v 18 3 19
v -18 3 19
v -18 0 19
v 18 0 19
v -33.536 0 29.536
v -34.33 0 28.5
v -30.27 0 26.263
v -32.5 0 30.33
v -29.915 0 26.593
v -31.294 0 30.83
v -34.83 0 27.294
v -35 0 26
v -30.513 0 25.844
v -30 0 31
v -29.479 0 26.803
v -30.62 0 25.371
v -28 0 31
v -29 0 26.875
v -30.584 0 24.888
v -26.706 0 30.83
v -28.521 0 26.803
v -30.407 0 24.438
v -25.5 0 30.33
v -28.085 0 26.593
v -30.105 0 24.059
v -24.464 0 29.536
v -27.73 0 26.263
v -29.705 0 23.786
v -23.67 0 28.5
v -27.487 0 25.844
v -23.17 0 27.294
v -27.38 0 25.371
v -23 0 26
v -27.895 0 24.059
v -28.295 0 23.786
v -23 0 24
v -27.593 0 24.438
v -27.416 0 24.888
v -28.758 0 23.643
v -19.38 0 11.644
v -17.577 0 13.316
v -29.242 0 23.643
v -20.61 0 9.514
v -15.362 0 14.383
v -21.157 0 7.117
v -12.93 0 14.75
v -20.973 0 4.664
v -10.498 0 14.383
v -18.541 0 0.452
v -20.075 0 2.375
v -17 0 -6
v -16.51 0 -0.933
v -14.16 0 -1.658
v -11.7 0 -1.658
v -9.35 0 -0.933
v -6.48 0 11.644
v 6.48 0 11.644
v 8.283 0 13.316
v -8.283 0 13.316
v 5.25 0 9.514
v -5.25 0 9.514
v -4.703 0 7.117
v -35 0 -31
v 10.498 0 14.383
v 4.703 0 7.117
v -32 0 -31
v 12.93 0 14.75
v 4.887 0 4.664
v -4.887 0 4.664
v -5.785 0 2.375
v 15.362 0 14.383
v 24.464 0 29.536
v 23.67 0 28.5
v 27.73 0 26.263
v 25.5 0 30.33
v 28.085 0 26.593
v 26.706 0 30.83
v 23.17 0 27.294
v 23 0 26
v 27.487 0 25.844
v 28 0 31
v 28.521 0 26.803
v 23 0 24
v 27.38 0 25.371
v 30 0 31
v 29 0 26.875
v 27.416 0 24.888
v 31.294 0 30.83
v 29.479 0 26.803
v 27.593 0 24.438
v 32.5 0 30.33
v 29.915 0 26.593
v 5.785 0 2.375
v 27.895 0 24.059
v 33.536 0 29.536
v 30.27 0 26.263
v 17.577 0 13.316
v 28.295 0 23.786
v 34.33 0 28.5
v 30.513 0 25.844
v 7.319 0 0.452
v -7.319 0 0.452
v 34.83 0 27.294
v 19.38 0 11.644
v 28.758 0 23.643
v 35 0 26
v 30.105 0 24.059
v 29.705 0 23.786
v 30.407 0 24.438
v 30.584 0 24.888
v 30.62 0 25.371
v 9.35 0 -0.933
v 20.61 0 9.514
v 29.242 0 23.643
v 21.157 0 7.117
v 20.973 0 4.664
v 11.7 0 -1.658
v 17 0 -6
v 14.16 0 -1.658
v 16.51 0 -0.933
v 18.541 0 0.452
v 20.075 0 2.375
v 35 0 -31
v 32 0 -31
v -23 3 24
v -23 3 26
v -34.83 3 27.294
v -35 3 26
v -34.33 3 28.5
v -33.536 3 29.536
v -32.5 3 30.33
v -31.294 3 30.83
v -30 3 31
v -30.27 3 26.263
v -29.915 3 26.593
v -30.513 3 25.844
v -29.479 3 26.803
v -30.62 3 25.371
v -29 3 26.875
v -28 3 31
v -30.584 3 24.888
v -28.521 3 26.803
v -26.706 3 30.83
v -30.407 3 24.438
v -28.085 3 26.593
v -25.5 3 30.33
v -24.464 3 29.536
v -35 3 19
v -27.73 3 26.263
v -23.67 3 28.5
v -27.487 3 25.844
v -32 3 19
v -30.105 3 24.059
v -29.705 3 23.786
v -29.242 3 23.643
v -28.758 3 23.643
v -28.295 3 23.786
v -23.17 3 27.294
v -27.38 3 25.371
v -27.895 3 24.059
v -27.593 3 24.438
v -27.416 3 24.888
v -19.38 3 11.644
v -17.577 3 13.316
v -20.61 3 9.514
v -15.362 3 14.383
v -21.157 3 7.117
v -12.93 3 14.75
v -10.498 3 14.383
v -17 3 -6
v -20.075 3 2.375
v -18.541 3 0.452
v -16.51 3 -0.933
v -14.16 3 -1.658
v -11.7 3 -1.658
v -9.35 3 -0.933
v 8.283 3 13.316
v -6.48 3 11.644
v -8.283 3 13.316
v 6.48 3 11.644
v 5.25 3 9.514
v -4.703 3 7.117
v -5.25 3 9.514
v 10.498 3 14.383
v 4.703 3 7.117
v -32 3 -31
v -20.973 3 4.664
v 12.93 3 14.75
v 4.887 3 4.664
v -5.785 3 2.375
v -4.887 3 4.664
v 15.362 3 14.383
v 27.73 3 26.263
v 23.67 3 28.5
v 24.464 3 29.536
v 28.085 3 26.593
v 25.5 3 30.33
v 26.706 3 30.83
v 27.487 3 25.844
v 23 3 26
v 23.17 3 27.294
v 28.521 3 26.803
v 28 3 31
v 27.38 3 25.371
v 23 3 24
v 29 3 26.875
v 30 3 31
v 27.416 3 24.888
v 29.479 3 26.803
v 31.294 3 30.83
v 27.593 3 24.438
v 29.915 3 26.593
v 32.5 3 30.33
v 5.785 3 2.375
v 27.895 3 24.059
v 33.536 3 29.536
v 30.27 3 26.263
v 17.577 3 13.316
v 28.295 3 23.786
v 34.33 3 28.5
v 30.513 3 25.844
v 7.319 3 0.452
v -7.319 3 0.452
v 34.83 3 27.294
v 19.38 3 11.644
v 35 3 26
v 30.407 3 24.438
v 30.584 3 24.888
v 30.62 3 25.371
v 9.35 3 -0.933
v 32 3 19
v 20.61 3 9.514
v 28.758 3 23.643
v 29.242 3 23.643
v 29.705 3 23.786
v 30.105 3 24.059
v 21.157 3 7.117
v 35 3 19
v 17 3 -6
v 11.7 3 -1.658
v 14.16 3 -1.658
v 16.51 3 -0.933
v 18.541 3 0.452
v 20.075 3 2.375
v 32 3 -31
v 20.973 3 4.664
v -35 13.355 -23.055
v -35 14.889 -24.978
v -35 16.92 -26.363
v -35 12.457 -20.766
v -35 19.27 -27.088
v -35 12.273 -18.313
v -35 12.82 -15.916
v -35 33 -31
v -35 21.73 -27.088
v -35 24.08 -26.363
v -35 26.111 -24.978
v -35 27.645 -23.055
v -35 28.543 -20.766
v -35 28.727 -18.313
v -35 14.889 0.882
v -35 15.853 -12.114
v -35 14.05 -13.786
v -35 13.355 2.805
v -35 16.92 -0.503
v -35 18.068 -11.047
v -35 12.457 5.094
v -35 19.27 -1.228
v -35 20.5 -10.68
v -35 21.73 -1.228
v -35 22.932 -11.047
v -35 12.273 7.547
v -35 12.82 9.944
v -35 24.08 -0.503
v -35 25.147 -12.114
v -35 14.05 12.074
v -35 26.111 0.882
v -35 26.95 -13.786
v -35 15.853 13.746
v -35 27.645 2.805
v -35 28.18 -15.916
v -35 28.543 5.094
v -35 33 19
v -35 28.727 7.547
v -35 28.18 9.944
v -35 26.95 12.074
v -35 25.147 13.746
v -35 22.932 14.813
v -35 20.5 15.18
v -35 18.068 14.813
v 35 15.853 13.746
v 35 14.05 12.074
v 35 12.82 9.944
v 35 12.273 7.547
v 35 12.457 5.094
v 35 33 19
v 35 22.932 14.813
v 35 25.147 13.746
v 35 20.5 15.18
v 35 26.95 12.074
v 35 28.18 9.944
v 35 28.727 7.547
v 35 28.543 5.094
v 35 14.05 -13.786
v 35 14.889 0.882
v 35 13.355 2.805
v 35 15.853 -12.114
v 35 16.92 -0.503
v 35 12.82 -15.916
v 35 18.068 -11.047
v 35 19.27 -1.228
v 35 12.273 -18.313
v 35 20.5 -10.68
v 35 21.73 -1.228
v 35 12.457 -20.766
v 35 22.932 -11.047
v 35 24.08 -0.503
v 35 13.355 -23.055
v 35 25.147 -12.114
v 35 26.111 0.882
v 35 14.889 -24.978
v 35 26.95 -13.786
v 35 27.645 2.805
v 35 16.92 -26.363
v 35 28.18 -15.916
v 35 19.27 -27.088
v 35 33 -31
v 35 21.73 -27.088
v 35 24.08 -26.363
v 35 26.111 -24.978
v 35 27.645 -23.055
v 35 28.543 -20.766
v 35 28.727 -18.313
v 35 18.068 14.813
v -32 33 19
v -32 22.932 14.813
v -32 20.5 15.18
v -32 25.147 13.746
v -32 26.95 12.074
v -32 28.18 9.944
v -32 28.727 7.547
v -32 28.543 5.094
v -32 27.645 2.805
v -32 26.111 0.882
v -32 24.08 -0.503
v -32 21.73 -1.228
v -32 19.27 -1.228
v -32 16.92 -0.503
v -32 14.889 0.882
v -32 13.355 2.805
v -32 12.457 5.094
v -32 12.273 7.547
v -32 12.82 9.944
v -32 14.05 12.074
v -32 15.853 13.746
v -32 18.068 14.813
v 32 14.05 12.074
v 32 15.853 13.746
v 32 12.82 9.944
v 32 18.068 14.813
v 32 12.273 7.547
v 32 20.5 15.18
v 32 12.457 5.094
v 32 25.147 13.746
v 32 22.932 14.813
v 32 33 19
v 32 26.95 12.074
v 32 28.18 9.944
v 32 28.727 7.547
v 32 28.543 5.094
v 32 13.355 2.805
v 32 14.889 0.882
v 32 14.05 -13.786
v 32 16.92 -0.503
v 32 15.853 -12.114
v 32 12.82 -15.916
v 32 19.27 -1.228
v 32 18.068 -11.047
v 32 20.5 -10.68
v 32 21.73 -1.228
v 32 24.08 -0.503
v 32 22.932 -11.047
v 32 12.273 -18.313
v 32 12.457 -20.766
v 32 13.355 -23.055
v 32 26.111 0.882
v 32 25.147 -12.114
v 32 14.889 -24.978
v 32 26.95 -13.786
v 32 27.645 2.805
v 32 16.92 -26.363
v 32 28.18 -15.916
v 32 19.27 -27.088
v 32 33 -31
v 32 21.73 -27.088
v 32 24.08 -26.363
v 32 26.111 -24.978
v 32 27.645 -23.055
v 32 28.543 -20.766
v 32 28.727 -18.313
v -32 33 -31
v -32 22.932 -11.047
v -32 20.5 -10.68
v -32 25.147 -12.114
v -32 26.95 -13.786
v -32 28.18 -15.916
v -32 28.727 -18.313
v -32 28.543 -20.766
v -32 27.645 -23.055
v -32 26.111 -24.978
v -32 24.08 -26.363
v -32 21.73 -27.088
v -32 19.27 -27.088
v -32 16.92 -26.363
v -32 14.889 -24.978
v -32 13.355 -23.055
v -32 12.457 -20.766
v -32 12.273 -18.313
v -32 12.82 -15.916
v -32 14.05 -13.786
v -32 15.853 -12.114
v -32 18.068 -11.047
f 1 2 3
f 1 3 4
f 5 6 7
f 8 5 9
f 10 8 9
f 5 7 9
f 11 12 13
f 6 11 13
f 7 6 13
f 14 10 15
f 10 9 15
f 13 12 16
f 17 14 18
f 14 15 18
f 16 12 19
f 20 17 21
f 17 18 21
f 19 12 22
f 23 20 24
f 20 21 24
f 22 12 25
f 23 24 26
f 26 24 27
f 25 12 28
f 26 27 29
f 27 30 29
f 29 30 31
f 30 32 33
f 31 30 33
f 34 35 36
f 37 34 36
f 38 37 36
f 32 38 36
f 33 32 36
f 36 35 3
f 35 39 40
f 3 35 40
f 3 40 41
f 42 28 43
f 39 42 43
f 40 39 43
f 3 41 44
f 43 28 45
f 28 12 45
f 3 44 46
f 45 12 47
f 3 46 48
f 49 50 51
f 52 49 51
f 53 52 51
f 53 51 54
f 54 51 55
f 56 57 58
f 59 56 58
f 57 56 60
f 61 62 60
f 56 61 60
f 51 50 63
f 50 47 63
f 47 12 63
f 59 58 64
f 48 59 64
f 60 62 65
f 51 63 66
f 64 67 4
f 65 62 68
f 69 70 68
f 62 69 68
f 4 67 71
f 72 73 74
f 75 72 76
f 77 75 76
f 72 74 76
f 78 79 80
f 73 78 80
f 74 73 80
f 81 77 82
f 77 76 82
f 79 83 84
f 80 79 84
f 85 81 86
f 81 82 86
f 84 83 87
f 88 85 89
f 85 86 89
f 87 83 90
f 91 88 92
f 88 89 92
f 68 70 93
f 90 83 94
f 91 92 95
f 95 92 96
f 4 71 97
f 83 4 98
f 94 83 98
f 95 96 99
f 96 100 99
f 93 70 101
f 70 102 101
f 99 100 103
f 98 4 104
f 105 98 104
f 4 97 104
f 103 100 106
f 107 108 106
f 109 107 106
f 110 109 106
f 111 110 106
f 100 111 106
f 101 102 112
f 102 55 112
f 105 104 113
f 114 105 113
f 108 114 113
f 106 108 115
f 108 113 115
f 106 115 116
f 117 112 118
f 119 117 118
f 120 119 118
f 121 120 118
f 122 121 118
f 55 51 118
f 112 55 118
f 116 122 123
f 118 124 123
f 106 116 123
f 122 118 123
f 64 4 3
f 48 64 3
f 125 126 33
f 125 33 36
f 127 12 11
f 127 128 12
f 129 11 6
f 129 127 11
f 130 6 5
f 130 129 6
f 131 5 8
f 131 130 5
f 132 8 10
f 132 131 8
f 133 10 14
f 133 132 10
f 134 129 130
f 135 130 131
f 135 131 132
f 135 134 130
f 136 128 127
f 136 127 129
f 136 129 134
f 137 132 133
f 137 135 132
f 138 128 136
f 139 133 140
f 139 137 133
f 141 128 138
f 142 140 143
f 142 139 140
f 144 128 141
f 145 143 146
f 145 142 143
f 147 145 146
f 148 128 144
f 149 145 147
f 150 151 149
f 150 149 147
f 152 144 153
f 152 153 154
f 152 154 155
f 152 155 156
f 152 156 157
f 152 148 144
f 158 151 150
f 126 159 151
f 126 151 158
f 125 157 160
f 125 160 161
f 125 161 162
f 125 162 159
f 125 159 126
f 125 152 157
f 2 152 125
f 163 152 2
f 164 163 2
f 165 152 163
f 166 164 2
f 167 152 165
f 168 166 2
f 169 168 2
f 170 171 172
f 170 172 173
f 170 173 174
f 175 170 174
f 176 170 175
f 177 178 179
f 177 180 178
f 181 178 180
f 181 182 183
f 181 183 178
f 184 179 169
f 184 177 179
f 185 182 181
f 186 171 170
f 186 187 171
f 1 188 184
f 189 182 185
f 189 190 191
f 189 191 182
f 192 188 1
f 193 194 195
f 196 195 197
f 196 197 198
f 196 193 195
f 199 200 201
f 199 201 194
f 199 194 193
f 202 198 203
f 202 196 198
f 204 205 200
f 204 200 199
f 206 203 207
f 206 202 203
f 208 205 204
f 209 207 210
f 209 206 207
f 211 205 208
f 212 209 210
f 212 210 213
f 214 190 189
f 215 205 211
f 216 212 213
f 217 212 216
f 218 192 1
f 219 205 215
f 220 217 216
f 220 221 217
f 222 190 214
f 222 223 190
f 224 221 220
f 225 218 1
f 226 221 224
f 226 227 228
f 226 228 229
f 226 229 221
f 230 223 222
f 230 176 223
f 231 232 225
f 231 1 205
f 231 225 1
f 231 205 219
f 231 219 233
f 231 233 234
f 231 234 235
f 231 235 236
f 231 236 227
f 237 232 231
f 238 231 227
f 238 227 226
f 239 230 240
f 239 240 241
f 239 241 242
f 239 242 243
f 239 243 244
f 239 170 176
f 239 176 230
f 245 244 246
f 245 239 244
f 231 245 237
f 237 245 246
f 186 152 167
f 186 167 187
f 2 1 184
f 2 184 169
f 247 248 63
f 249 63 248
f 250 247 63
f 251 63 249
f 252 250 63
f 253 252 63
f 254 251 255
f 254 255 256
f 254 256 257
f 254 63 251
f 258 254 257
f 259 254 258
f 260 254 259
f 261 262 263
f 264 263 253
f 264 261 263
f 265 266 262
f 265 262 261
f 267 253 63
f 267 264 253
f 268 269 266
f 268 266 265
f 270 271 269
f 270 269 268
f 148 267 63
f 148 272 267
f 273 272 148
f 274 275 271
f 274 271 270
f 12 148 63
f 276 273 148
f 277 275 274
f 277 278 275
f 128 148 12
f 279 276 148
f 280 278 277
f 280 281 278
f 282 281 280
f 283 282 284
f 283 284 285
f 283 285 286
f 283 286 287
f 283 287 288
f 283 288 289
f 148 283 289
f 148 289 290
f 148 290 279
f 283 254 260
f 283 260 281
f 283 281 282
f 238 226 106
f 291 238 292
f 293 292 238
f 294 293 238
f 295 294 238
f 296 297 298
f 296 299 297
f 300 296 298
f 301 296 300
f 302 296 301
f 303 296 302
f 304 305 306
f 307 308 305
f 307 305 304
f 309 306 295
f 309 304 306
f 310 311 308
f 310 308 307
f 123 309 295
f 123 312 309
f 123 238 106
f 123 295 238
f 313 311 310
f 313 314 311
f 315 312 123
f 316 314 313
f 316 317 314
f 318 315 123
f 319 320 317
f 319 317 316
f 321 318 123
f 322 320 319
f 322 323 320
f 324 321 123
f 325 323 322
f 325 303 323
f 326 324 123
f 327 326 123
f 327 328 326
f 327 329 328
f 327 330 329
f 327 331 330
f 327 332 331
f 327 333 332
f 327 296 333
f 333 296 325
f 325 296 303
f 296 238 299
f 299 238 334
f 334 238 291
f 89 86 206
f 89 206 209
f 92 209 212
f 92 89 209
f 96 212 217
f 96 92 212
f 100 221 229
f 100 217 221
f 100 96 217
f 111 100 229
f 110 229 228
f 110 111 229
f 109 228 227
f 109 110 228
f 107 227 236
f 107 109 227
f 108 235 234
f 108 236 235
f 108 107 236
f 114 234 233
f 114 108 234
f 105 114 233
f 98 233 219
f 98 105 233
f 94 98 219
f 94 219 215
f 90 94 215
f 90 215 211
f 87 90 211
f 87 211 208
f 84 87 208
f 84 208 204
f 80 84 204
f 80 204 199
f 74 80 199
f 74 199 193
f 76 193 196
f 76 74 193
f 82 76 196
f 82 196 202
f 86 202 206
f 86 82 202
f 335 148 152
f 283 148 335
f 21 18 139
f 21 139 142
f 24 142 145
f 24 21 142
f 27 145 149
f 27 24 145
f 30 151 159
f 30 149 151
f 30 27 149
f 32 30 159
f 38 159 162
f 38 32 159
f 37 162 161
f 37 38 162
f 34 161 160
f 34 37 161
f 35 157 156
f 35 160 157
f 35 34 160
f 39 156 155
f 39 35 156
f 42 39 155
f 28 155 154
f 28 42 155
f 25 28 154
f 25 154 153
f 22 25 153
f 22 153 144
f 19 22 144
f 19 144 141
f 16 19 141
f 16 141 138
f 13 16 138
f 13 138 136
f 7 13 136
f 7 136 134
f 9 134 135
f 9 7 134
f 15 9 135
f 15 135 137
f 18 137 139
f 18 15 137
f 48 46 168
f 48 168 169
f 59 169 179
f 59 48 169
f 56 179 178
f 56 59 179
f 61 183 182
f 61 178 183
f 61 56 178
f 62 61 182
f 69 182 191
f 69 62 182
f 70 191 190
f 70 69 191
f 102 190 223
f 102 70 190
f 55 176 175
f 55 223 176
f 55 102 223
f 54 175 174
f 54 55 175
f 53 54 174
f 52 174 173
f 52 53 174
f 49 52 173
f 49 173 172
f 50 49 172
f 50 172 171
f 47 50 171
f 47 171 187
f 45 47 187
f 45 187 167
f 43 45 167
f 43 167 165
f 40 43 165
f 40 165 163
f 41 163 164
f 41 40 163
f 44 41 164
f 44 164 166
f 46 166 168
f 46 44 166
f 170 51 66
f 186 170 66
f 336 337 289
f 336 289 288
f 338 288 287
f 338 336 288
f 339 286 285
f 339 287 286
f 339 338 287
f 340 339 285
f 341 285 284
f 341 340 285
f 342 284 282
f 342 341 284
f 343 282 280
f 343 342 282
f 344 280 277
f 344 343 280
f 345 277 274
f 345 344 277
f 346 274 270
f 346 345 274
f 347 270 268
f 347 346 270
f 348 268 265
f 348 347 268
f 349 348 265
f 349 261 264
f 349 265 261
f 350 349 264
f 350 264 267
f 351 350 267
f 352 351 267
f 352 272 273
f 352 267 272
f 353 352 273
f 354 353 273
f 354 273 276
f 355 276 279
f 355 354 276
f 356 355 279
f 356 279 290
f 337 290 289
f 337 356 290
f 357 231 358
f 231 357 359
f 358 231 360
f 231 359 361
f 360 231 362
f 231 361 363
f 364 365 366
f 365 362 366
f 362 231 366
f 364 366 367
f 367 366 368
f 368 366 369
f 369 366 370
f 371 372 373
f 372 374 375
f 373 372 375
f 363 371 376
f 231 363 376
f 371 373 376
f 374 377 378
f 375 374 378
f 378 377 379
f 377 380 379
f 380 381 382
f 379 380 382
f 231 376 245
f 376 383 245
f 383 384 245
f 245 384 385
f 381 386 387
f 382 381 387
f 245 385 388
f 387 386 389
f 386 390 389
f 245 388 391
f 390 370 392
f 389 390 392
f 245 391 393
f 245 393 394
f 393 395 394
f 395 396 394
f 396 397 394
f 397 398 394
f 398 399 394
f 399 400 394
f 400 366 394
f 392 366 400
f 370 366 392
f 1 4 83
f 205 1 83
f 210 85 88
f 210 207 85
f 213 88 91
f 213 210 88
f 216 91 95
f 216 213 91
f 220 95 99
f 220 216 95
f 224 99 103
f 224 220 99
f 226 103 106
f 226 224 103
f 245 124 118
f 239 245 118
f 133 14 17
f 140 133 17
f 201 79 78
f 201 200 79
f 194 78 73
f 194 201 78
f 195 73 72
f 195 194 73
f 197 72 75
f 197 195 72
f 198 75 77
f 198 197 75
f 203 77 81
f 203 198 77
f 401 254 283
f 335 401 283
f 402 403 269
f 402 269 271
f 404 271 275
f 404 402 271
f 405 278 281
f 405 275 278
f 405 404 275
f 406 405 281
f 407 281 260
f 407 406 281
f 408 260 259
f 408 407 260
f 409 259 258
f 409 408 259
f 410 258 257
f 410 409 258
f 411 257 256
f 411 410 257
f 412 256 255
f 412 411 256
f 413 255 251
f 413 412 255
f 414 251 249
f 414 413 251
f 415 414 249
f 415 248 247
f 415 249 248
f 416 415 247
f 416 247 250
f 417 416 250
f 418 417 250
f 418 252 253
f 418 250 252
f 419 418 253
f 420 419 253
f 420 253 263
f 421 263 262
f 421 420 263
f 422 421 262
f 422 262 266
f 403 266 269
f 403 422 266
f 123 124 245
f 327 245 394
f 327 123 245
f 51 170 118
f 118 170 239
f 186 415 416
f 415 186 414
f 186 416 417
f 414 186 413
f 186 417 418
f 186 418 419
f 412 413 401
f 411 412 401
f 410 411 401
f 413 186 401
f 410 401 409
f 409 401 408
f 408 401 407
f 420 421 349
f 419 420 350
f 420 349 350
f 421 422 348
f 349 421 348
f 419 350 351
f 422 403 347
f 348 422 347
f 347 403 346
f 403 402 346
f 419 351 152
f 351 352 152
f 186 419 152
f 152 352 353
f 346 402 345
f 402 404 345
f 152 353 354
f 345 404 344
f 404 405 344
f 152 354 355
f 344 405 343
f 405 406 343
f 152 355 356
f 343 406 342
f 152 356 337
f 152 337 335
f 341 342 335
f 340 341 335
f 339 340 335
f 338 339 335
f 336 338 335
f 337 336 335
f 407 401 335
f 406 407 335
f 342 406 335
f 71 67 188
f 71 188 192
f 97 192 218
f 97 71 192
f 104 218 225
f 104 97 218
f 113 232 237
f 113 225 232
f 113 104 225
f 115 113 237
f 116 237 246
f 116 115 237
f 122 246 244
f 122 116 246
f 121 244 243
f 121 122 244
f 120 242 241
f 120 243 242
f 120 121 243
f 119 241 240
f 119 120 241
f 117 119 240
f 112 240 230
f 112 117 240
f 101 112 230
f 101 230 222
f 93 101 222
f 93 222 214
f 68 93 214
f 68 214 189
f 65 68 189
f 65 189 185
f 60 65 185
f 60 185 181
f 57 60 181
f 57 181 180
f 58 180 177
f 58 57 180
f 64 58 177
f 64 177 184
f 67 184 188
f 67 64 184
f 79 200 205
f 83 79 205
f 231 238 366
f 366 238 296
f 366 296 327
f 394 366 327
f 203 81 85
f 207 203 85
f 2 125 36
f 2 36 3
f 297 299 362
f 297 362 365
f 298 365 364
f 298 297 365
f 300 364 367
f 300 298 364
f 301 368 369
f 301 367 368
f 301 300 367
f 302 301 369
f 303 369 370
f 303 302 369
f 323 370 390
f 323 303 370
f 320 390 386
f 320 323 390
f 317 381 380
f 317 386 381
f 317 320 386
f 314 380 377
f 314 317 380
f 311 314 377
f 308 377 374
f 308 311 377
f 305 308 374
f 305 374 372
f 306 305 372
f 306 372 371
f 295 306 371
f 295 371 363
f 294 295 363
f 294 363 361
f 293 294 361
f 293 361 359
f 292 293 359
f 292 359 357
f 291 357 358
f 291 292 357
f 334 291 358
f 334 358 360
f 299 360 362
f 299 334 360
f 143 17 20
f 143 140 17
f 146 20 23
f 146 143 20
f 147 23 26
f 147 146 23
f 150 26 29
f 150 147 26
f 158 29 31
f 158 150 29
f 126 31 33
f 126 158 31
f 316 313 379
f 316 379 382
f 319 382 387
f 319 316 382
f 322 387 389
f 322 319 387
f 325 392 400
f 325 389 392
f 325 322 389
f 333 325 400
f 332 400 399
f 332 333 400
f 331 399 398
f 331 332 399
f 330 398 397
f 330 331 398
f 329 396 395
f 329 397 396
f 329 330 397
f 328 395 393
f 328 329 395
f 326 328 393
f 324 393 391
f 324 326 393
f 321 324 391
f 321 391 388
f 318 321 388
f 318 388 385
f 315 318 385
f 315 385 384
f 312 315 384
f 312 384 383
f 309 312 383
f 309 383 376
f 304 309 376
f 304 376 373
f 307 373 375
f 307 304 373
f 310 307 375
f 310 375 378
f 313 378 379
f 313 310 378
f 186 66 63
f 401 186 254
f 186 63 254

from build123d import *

# Parameters (mm, degrees)
CROQUIS1_W                 = 70
CROQUIS1_H                 = 62
SALIENTE_EXTRUIR1_DEPTH    = 3
CORTAR_EXTRUIR1_DEPTH      = 47.8508271
CORTAR_EXTRUIR2_DEPTH      = 47.8508271
CROQUIS4_W                 = 46
CROQUIS4_H                 = 10
CORTAR_EXTRUIR3_DEPTH      = 47.8508271
CROQUIS5_W                 = 46
CROQUIS5_H                 = 2
CORTAR_EXTRUIR4_DEPTH      = 47.8508271
CORTAR_EXTRUIR5_DEPTH      = 47.8508271
CORTAR_EXTRUIR5_DEPTH_BACK = 47.8508271
CROQUIS6_R                 = 1.625
CHAFL_N1_START             = -4
CHAFL_N1_OUTLINE_W         = 7.071067812
CHAFL_N1_OUTLINE_H         = 3
CHAFL_N1_DEPTH             = 4.707106781
CHAFL_N2_START             = -0.707106781
CHAFL_N2_OUTLINE_W         = 7.071067812
CHAFL_N2_OUTLINE_H         = 3
CHAFL_N2_DEPTH             = 4.707106781
CORTAR_EXTRUIR6_DEPTH      = 47.8508271
CORTAR_EXTRUIR6_DEPTH_BACK = 47.8508271
CROQUIS7_R                 = 8.25
SALIENTE_EXTRUIR2_DEPTH    = 3
CORTAR_EXTRUIR7_DEPTH      = 69.23672032
CORTAR_EXTRUIR7_DEPTH_BACK = 69.23672032
CORTAR_EXTRUIR8_DEPTH      = 47.8508271
CHAFL_N3_DEPTH             = 3
CHAFL_N5_DEPTH             = 3
CROQUIS13_W                = 50
CROQUIS13_H                = 30
SALIENTE_EXTRUIR3_DEPTH    = 3
CROQUIS14_W                = 50
CROQUIS14_H                = 30
SALIENTE_EXTRUIR4_DEPTH    = 3
REDONDEO1_R                = 5
CORTAR_EXTRUIR9_DEPTH      = 84.366660003
CORTAR_EXTRUIR9_DEPTH_BACK = 84.366660003
CROQUIS16_R                = 8.25


with BuildPart() as part:
    # Croquis1 → Saliente-Extruir1 (new body)
    with BuildSketch(Plane(origin=(0, 0, 0), x_dir=(1, 0, 0), z_dir=(0, 1, 0))):
        Rectangle(CROQUIS1_W, CROQUIS1_H)
    extrude(amount=SALIENTE_EXTRUIR1_DEPTH)

    # Croquis2 → Cortar-Extruir1 (cut, through all)
    with BuildSketch(Plane(origin=(0, 3, 0), x_dir=(1, 0, 0), z_dir=(0, 1, 0))):
        Polygon((31.754264805, 31), (15.877132403, 58.5), (-15.877132403, 58.5), (-31.754264805, 31), (-15.877132403, 3.5), (15.877132403, 3.5), align=None)
    extrude(amount=-CORTAR_EXTRUIR1_DEPTH, mode=Mode.SUBTRACT)

    # Croquis3 → Cortar-Extruir2 (cut, through all)
    with BuildSketch(Plane(origin=(0, 3, 0), x_dir=(1, 0, 0), z_dir=(0, 1, 0))):
        with BuildLine():
            Line((-13, -21), (13, -21))
            ThreePointArc((13, -21), (23, -31), (13, -41))
            Line((13, -41), (-13, -41))
            ThreePointArc((-13, -41), (-23, -31), (-13, -21))
        make_face()
    extrude(amount=-CORTAR_EXTRUIR2_DEPTH, mode=Mode.SUBTRACT)

    # Croquis4 → Cortar-Extruir3 (cut, through all)
    with BuildSketch(Plane(origin=(0, 3, 0), x_dir=(1, 0, 0), z_dir=(0, 1, 0))):
        with Locations((0, -26)):
            Rectangle(CROQUIS4_W, CROQUIS4_H)
    extrude(amount=-CORTAR_EXTRUIR3_DEPTH, mode=Mode.SUBTRACT)

    # Croquis5 → Cortar-Extruir4 (cut, through all)
    with BuildSketch(Plane(origin=(0, 3, 0), x_dir=(1, 0, 0), z_dir=(0, 1, 0))):
        with Locations((0, -20)):
            Rectangle(CROQUIS5_W, CROQUIS5_H)
    extrude(amount=-CORTAR_EXTRUIR4_DEPTH, mode=Mode.SUBTRACT)

    # Croquis6 → Cortar-Extruir5 (cut, two sides: drawn at the far end of the back side and taken through both)
    with BuildSketch(Plane(origin=(0, 3, 0), x_dir=(1, 0, 0), z_dir=(0, 1, 0)).offset(-CORTAR_EXTRUIR5_DEPTH_BACK)):
        with Locations(Location((-29, -25.25, 0), (0, 0, 270))):
            Circle(CROQUIS6_R)
        with Locations(Location((29, -25.25, 0), (0, 0, 270))):
            Circle(CROQUIS6_R)
    extrude(amount=CORTAR_EXTRUIR5_DEPTH + CORTAR_EXTRUIR5_DEPTH_BACK, mode=Mode.SUBTRACT)

    # Chaflán1: read off the stored shape, not the designer's step
    # Chaflán1 outline → Chaflán1 (add)
    with BuildSketch(Plane(origin=(0, 0, 0), x_dir=(0.7071067811865471, 0, -0.707106781186548), z_dir=(0.707106781186548, 0, 0.707106781186547)).offset(CHAFL_N1_START)):
        with Locations((-29.69848481, 1.5)):
            Rectangle(CHAFL_N1_OUTLINE_W, CHAFL_N1_OUTLINE_H)
    extrude(amount=CHAFL_N1_DEPTH)

    # Chaflán2: read off the stored shape, not the designer's step
    # Chaflán2 outline → Chaflán2 (add)
    with BuildSketch(Plane(origin=(0, 0, 0), x_dir=(0.707106781186548, 0, 0.707106781186547), z_dir=(0.707106781186547, 0, -0.707106781186548)).offset(CHAFL_N2_START)):
        with Locations((29.69848481, -1.5)):
            Rectangle(CHAFL_N2_OUTLINE_W, CHAFL_N2_OUTLINE_H)
    extrude(amount=CHAFL_N2_DEPTH)

    # Croquis7 → Cortar-Extruir6 (cut, two sides: drawn at the far end of the back side and taken through both)
    with BuildSketch(Plane(origin=(0, 3, 0), x_dir=(1, 0, 0), z_dir=(0, 1, 0)).offset(-CORTAR_EXTRUIR6_DEPTH_BACK)):
        with Locations(Location((-12.93, -6.5, 0), (0, 0, 270))):
            Circle(CROQUIS7_R)
        with Locations(Location((12.93, -6.5, 0), (0, 0, 270))):
            Circle(CROQUIS7_R)
    extrude(amount=CORTAR_EXTRUIR6_DEPTH + CORTAR_EXTRUIR6_DEPTH_BACK, mode=Mode.SUBTRACT)

    # Croquis8 → Saliente-Extruir2 (add)
    with BuildSketch(Plane(origin=(0, 3, 0), x_dir=(1, 0, 0), z_dir=(0, 1, 0))):
        Polygon((15.877132403, 3.5), (31.754264805, 31), (15.877132403, 58.5), (-15.877132403, 58.5), (-31.754264805, 31), (-15.877132403, 3.5), (0, 3.5), align=None)
    extrude(amount=-SALIENTE_EXTRUIR2_DEPTH)

    # Croquis9 → Cortar-Extruir7 (cut, two sides: drawn at the far end of the back side and taken through both)
    with BuildSketch(Plane(origin=(0, 3, 0), x_dir=(1, 0, 0), z_dir=(0, 1, 0)).offset(-CORTAR_EXTRUIR7_DEPTH_BACK)):
        Polygon((-232.018715641, 31), (-35, 31), (35, 31), (232.018715641, 31), (232.018715641, 425.037431282), (-232.018715641, 425.037431282), align=None)
    extrude(amount=CORTAR_EXTRUIR7_DEPTH + CORTAR_EXTRUIR7_DEPTH_BACK, mode=Mode.SUBTRACT)

    # Croquis10 → Cortar-Extruir8 (cut, through all)
    with BuildSketch(Plane(origin=(0, 3, 0), x_dir=(1, 0, 0), z_dir=(0, 1, 0))):
        Polygon((0, 6), (-32, 6), (-32, 31), (32, 31), (32, 6), align=None)
    extrude(amount=-CORTAR_EXTRUIR8_DEPTH, mode=Mode.SUBTRACT)

    # Chaflán3: read off the stored shape, not the designer's step
    # Chaflán3 outline → Chaflán3 (add)
    with BuildSketch(Plane(origin=(0, 0, 0), x_dir=(1, 0, 0), z_dir=(0, 1, 0))):
        Polygon((-32, 6), (-17, 6), (-32, 31), align=None)
    extrude(amount=CHAFL_N3_DEPTH)

    # Chaflán5: read off the stored shape, not the designer's step
    # Chaflán5 outline → Chaflán5 (add)
    with BuildSketch(Plane(origin=(0, 0, 0), x_dir=(1, 0, 0), z_dir=(0, 1, 0))):
        Polygon((32, 6), (32, 31), (17, 6), align=None)
    extrude(amount=CHAFL_N5_DEPTH)

    # Croquis13 → Saliente-Extruir3 (add)
    with BuildSketch(Plane.ZY.offset(35)):
        with Locations((-6, 18)):
            Rectangle(CROQUIS13_W, CROQUIS13_H)
    extrude(amount=-SALIENTE_EXTRUIR3_DEPTH)

    # Croquis14 → Saliente-Extruir4 (add)
    with BuildSketch(Plane(origin=(35, 0, 0), x_dir=(0, 0, -1), z_dir=(1, 0, 0))):
        with Locations((6, 18)):
            Rectangle(CROQUIS14_W, CROQUIS14_H)
    extrude(amount=-SALIENTE_EXTRUIR4_DEPTH)

    # Redondeo1
    redondeo1_edges = [part.edges().sort_by_distance(p)[0] for p in [
        (-23, 1.5, 31),
        (23, 1.5, 31),
        (35, 1.5, 31),
        (-35, 1.5, 31),
    ]]
    fillet(redondeo1_edges, radius=REDONDEO1_R)

    # Croquis16 → Cortar-Extruir9 (cut, two sides: drawn at the far end of the back side and taken through both)
    with BuildSketch(Plane.ZY.offset(35).offset(-CORTAR_EXTRUIR9_DEPTH_BACK)):
        with Locations((-18.93, 20.5)):
            Circle(CROQUIS16_R)
        with Locations((6.93, 20.5)):
            Circle(CROQUIS16_R)
    extrude(amount=CORTAR_EXTRUIR9_DEPTH + CORTAR_EXTRUIR9_DEPTH_BACK, mode=Mode.SUBTRACT)


solid = part.part
